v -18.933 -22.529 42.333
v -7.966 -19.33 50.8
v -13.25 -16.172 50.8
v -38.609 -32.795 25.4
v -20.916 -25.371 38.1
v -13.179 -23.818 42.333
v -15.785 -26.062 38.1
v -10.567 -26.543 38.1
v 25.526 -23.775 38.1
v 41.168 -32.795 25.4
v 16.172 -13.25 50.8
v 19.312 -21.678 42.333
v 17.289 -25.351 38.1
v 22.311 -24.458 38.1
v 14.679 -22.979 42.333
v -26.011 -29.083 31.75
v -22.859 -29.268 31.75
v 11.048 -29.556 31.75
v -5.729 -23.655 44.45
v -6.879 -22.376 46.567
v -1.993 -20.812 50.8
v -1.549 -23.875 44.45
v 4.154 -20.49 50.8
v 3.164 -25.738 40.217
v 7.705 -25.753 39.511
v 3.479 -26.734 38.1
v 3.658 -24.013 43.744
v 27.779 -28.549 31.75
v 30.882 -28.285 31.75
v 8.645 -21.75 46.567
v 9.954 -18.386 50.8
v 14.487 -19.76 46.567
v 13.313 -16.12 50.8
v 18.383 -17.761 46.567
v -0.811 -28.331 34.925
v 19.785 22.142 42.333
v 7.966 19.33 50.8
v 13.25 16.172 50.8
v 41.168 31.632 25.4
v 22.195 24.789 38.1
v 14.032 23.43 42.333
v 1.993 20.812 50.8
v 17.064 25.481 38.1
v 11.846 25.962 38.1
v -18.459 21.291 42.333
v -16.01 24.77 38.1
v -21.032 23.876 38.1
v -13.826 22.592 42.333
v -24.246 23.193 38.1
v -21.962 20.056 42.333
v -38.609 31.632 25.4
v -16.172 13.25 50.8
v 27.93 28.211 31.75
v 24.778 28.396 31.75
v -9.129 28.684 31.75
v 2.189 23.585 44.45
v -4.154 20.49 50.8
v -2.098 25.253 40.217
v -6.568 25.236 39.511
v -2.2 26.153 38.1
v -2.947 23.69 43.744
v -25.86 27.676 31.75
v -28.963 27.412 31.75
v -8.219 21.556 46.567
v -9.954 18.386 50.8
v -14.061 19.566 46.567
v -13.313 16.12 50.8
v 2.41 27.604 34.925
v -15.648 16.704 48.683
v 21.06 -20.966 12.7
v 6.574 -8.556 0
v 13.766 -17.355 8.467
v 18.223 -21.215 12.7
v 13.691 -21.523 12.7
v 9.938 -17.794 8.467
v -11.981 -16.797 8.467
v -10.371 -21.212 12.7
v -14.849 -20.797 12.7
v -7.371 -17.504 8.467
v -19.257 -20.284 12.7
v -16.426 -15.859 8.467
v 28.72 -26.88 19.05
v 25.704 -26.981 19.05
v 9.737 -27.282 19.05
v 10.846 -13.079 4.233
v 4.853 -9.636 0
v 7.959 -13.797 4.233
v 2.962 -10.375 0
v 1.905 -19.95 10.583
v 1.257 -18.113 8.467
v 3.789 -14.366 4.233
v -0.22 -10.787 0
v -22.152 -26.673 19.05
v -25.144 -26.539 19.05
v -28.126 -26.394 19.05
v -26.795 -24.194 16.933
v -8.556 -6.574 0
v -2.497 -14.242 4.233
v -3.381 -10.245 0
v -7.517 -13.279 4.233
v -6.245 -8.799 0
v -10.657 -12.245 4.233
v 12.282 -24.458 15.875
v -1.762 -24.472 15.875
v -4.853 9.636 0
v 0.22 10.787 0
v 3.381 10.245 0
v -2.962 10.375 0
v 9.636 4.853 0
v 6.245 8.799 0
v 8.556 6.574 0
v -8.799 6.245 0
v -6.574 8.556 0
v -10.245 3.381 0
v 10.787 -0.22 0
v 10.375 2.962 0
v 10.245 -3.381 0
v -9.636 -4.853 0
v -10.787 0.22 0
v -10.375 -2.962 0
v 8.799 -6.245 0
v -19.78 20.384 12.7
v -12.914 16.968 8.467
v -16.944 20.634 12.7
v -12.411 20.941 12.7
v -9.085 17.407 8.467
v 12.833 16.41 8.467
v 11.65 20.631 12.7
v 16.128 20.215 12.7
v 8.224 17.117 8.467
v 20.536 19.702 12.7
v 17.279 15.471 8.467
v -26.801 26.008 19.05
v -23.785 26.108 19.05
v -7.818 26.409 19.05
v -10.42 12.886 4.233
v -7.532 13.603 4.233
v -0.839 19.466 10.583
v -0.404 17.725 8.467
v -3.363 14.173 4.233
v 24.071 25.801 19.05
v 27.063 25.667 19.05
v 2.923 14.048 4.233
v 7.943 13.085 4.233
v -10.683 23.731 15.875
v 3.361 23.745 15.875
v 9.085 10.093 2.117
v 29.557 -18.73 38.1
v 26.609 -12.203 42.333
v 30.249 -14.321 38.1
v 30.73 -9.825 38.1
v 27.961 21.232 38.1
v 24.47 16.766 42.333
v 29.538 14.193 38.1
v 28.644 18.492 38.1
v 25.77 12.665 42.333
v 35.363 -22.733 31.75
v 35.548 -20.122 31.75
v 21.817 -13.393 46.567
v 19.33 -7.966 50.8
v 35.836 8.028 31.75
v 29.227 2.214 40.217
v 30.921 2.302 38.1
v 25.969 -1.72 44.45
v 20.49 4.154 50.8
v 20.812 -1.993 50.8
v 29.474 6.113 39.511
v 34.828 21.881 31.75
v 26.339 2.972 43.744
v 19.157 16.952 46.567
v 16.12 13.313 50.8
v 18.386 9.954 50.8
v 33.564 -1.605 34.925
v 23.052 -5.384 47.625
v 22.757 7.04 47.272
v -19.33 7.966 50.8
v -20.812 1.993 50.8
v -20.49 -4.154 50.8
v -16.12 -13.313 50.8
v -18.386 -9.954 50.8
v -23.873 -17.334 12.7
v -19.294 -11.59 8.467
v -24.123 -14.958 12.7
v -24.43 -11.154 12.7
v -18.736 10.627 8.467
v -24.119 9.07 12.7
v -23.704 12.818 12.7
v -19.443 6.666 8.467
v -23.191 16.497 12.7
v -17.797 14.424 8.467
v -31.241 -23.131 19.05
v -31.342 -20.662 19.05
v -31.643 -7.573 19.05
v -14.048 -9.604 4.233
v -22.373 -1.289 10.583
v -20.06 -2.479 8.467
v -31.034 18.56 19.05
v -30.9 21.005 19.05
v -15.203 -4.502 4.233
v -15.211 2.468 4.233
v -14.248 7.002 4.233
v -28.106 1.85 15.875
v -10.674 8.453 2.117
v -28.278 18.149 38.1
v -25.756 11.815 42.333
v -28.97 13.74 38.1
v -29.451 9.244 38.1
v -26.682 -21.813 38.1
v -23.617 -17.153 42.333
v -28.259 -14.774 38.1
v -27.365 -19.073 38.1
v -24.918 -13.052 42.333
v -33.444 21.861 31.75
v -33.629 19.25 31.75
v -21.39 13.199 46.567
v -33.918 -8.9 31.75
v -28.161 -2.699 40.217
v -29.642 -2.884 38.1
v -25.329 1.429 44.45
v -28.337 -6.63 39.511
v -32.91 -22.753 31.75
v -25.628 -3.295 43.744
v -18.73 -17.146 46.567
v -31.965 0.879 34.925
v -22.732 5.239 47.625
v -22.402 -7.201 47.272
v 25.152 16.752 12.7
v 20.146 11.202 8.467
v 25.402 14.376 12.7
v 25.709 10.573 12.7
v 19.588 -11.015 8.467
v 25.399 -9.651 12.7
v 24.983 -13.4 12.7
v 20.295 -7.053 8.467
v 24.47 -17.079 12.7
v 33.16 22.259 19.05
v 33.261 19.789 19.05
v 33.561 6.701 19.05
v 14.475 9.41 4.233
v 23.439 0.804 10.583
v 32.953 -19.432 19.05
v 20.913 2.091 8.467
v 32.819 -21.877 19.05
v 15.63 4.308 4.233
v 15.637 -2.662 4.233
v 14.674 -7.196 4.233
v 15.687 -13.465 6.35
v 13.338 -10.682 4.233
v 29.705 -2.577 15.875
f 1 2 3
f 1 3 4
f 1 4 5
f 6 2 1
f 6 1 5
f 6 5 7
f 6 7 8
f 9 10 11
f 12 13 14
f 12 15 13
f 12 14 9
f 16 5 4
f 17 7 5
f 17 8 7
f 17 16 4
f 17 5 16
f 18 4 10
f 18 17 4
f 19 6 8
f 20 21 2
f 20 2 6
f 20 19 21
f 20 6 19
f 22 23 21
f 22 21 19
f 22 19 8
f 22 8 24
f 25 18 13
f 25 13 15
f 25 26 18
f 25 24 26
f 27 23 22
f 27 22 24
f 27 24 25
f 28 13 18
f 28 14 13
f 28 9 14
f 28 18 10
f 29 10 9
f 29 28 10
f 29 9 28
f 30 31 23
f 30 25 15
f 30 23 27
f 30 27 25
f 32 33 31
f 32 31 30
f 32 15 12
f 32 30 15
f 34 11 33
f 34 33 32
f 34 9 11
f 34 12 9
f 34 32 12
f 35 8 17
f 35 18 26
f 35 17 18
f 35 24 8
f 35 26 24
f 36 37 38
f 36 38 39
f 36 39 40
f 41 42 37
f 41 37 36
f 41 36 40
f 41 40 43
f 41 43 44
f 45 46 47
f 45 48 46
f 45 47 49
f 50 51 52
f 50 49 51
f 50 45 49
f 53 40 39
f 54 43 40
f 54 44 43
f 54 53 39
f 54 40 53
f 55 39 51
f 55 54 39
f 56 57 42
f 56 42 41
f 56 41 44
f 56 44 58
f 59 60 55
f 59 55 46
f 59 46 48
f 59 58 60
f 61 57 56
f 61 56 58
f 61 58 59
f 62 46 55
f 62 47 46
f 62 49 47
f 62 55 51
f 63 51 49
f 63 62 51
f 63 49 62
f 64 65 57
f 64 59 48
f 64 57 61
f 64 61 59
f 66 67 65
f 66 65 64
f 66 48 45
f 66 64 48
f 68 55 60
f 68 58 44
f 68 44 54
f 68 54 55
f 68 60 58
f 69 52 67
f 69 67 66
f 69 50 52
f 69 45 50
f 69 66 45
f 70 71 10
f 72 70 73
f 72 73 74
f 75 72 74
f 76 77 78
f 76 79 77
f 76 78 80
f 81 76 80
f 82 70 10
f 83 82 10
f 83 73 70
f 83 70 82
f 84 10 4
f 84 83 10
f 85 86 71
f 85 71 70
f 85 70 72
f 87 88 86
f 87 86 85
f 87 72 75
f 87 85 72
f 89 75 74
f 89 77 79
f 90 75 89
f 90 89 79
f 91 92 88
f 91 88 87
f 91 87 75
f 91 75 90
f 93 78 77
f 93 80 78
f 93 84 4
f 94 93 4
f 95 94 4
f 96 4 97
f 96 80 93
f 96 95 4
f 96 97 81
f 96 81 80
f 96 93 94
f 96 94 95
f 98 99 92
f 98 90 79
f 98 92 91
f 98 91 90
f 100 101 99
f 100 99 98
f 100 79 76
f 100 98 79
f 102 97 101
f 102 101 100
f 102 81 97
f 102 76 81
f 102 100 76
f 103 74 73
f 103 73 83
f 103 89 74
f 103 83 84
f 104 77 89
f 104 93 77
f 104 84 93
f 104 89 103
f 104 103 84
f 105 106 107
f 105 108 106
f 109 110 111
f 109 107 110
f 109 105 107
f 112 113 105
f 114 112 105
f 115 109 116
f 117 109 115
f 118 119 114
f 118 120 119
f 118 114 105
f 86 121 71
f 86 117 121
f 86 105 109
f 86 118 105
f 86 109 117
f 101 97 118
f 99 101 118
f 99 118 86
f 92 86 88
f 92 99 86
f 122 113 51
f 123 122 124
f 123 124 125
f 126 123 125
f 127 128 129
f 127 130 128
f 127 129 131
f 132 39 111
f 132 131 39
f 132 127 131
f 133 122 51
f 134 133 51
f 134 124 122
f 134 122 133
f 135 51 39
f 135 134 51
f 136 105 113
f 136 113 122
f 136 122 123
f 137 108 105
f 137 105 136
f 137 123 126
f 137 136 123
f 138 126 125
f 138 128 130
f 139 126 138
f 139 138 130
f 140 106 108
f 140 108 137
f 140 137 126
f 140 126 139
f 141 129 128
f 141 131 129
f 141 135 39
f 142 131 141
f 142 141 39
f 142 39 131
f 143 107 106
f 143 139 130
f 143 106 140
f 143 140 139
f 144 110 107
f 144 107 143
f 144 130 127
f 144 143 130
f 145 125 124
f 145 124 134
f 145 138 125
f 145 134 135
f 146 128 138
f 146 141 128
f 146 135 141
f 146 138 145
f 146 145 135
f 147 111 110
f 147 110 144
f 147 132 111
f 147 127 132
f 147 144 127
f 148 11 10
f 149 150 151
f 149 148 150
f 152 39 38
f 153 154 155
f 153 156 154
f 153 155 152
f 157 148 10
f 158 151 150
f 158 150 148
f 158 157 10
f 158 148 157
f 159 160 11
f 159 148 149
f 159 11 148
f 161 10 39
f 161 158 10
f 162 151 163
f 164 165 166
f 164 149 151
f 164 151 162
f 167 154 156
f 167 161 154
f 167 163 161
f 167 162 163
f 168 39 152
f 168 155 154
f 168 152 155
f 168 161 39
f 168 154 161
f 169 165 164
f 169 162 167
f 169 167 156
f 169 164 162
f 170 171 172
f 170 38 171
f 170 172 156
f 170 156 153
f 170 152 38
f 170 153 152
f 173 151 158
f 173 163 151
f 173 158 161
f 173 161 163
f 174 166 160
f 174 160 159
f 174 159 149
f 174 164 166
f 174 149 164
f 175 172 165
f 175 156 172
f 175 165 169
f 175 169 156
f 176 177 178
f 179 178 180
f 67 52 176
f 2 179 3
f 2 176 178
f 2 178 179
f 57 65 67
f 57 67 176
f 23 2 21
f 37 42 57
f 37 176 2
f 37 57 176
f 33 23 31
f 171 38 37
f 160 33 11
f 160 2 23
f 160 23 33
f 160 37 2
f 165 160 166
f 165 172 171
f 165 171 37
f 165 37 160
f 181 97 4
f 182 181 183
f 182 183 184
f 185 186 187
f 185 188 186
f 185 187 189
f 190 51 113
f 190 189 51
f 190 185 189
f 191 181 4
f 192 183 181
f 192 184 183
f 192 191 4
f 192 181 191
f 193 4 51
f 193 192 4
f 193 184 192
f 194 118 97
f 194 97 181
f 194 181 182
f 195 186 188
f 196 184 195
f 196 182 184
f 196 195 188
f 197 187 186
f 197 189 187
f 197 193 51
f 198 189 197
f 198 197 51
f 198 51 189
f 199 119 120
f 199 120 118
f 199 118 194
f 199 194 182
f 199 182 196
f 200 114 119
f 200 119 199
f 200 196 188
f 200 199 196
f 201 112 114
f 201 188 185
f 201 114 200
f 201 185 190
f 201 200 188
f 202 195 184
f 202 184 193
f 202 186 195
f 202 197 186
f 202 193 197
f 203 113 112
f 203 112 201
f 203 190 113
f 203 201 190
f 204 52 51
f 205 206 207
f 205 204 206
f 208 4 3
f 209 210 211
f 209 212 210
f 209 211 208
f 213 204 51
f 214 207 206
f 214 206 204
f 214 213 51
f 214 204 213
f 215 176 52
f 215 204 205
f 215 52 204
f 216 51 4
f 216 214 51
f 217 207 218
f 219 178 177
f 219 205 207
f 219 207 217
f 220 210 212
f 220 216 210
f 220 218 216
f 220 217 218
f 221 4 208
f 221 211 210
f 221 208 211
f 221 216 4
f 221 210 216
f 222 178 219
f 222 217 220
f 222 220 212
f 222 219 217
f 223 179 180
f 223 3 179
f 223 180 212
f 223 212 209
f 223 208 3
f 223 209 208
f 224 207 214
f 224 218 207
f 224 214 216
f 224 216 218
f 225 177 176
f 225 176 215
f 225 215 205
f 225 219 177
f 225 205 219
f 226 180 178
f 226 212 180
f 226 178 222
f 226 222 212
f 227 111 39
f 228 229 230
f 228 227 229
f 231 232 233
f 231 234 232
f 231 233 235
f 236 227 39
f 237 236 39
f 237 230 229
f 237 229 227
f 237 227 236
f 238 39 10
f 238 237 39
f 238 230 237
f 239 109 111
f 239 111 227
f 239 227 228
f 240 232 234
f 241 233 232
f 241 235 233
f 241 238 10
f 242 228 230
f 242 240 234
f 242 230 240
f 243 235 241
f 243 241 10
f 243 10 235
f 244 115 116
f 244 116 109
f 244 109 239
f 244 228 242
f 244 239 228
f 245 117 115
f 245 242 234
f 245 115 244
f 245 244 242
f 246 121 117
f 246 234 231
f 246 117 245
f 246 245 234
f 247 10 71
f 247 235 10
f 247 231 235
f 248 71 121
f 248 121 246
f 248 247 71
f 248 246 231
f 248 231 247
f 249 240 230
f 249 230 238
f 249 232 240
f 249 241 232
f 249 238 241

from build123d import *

# Parameters (mm, degrees)
F3_W      = 79.7774158418
F3_H      = 64.4266568124
F5_FACE_W = 79.7774158418
F5_FACE_H = 64.4266568124


# Not quite as in the source:
# - the arcs of a loft's sections are written as splines that run evenly, so that the points pair up as in the source's solid


with BuildPart() as f5:
    # F3 (on offset) → F5 section 0
    with BuildSketch(Plane.XY.offset(25.4)):
        with Locations((1.2792292982, -0.5814675242)):
            Rectangle(F3_W, F3_H)
    # F2 (on offset) → F5 section 1
    with BuildSketch(Plane.XY.offset(50.8)):
        with BuildLine():
            add(Edge.make_bspline(
                [(-16.1724337652, 13.2497043015), (-17.0396248839, 12.1912209867), (-17.8025456302, 11.0473550868), (-19.0906024978, 8.6327041883), (-19.6157067692, 7.3619788968), (-20.4079389638, 4.7424374092), (-20.6750472976, 3.3936859865), (-20.9410097804, 0.6699214201), (-20.939857353, -0.7050243732), (-20.6693293349, -3.4283392736), (-20.3999604336, -4.7766410415), (-19.6033381546, -7.3948508116), (-19.0761044751, -8.6646940734), (-17.7840016828, -11.0771823799), (-17.0191645197, -12.2197677712), (-15.2812359996, -14.3338240416), (-14.3081876162, -15.3052426465), (-13.2497043015, -16.1724337652)],
                knots=[0, 0, 0, 0, 0.125, 0.125, 0.25, 0.25, 0.375, 0.375, 0.5, 0.5, 0.625, 0.625, 0.75, 0.75, 0.875, 0.875, 1, 1, 1, 1], degree=3))
            add(Edge.make_bspline(
                [(-13.2497043015, -16.1724337652), (-12.1912209867, -17.0396248839), (-11.0473550868, -17.8025456302), (-8.6327041883, -19.0906024978), (-7.3619788968, -19.6157067692), (-4.7424374092, -20.4079389638), (-3.3936859865, -20.6750472976), (-0.6699214201, -20.9410097804), (0.7050243732, -20.939857353), (3.4283392736, -20.6693293349), (4.7766410415, -20.3999604336), (7.3948508116, -19.6033381546), (8.6646940734, -19.0761044751), (11.0771823799, -17.7840016828), (12.2197677712, -17.0191645197), (14.3338240416, -15.2812359996), (15.3052426465, -14.3081876162), (16.1724337652, -13.2497043015)],
                knots=[0, 0, 0, 0, 0.125, 0.125, 0.25, 0.25, 0.375, 0.375, 0.5, 0.5, 0.625, 0.625, 0.75, 0.75, 0.875, 0.875, 1, 1, 1, 1], degree=3))
            add(Edge.make_bspline(
                [(16.1724337652, -13.2497043015), (17.0396248839, -12.1912209867), (17.8025456302, -11.0473550868), (19.0906024978, -8.6327041883), (19.6157067692, -7.3619788968), (20.4079389638, -4.7424374092), (20.6750472976, -3.3936859865), (20.9410097804, -0.6699214201), (20.939857353, 0.7050243732), (20.6693293349, 3.4283392736), (20.3999604336, 4.7766410415), (19.6033381546, 7.3948508116), (19.0761044751, 8.6646940734), (17.7840016828, 11.0771823799), (17.0191645197, 12.2197677712), (15.2812359996, 14.3338240416), (14.3081876162, 15.3052426465), (13.2497043015, 16.1724337652)],
                knots=[0, 0, 0, 0, 0.125, 0.125, 0.25, 0.25, 0.375, 0.375, 0.5, 0.5, 0.625, 0.625, 0.75, 0.75, 0.875, 0.875, 1, 1, 1, 1], degree=3))
            add(Edge.make_bspline(
                [(13.2497043015, 16.1724337652), (12.1912209867, 17.0396248839), (11.0473550868, 17.8025456302), (8.6327041883, 19.0906024978), (7.3619788968, 19.6157067692), (4.7424374092, 20.4079389638), (3.3936859865, 20.6750472976), (0.6699214201, 20.9410097804), (-0.7050243732, 20.939857353), (-3.4283392736, 20.6693293349), (-4.7766410415, 20.3999604336), (-7.3948508116, 19.6033381546), (-8.6646940734, 19.0761044751), (-11.0771823799, 17.7840016828), (-12.2197677712, 17.0191645197), (-14.3338240416, 15.2812359996), (-15.3052426465, 14.3081876162), (-16.1724337652, 13.2497043015)],
                knots=[0, 0, 0, 0, 0.125, 0.125, 0.25, 0.25, 0.375, 0.375, 0.5, 0.5, 0.625, 0.625, 0.75, 0.75, 0.875, 0.875, 1, 1, 1, 1], degree=3))
        make_face()
    loft(ruled=True)

    # F5_face (on face) → F6 section 0
    with BuildSketch(Plane(origin=(1.2792292982, -0.5814675242, 25.4), x_dir=(1, 0, 0), z_dir=(0, 0, -1))):
        Rectangle(F5_FACE_W, F5_FACE_H)
    # F4 (on Top) → F6 section 1
    with BuildSketch(Plane.XY):
        with BuildLine():
            add(Edge.make_bspline(
                [(8.5557200784, 6.5738865133), (7.6952003461, 7.6938276526), (6.6123366987, 8.6422274732), (4.1651377242, 10.0529955761), (2.8017652653, 10.5148087816), (0.0009706408, 10.8816860538), (-1.4353495317, 10.78660577), (-4.1633442138, 10.0537384724), (-5.4539453739, 9.4162398107), (-6.5738865133, 8.5557200784)],
                knots=[0, 0, 0, 0, 0.25, 0.25, 0.5, 0.5, 0.75, 0.75, 1, 1, 1, 1], degree=3))
            add(Edge.make_bspline(
                [(-6.5738865133, 8.5557200784), (-7.6938276526, 7.6952003461), (-8.6422274732, 6.6123366987), (-10.0529955761, 4.1651377242), (-10.5148087816, 2.8017652653), (-10.8816860538, 0.0009706408), (-10.78660577, -1.4353495317), (-10.0537384724, -4.1633442138), (-9.4162398107, -5.4539453739), (-8.5557200784, -6.5738865133)],
                knots=[0, 0, 0, 0, 0.25, 0.25, 0.5, 0.5, 0.75, 0.75, 1, 1, 1, 1], degree=3))
            add(Edge.make_bspline(
                [(-8.5557200784, -6.5738865133), (-7.6952003461, -7.6938276526), (-6.6123366987, -8.6422274732), (-4.1651377242, -10.0529955761), (-2.8017652653, -10.5148087816), (-0.0009706408, -10.8816860538), (1.4353495317, -10.78660577), (4.1633442138, -10.0537384724), (5.4539453739, -9.4162398107), (6.5738865133, -8.5557200784)],
                knots=[0, 0, 0, 0, 0.25, 0.25, 0.5, 0.5, 0.75, 0.75, 1, 1, 1, 1], degree=3))
            add(Edge.make_bspline(
                [(6.5738865133, -8.5557200784), (7.6938276526, -7.6952003461), (8.6422274732, -6.6123366987), (10.0529955761, -4.1651377242), (10.5148087816, -2.8017652653), (10.8816860538, -0.0009706408), (10.78660577, 1.4353495317), (10.0537384724, 4.1633442138), (9.4162398107, 5.4539453739), (8.5557200784, 6.5738865133)],
                knots=[0, 0, 0, 0, 0.25, 0.25, 0.5, 0.5, 0.75, 0.75, 1, 1, 1, 1], degree=3))
        make_face()
    loft(ruled=True)


solid = f5.part
